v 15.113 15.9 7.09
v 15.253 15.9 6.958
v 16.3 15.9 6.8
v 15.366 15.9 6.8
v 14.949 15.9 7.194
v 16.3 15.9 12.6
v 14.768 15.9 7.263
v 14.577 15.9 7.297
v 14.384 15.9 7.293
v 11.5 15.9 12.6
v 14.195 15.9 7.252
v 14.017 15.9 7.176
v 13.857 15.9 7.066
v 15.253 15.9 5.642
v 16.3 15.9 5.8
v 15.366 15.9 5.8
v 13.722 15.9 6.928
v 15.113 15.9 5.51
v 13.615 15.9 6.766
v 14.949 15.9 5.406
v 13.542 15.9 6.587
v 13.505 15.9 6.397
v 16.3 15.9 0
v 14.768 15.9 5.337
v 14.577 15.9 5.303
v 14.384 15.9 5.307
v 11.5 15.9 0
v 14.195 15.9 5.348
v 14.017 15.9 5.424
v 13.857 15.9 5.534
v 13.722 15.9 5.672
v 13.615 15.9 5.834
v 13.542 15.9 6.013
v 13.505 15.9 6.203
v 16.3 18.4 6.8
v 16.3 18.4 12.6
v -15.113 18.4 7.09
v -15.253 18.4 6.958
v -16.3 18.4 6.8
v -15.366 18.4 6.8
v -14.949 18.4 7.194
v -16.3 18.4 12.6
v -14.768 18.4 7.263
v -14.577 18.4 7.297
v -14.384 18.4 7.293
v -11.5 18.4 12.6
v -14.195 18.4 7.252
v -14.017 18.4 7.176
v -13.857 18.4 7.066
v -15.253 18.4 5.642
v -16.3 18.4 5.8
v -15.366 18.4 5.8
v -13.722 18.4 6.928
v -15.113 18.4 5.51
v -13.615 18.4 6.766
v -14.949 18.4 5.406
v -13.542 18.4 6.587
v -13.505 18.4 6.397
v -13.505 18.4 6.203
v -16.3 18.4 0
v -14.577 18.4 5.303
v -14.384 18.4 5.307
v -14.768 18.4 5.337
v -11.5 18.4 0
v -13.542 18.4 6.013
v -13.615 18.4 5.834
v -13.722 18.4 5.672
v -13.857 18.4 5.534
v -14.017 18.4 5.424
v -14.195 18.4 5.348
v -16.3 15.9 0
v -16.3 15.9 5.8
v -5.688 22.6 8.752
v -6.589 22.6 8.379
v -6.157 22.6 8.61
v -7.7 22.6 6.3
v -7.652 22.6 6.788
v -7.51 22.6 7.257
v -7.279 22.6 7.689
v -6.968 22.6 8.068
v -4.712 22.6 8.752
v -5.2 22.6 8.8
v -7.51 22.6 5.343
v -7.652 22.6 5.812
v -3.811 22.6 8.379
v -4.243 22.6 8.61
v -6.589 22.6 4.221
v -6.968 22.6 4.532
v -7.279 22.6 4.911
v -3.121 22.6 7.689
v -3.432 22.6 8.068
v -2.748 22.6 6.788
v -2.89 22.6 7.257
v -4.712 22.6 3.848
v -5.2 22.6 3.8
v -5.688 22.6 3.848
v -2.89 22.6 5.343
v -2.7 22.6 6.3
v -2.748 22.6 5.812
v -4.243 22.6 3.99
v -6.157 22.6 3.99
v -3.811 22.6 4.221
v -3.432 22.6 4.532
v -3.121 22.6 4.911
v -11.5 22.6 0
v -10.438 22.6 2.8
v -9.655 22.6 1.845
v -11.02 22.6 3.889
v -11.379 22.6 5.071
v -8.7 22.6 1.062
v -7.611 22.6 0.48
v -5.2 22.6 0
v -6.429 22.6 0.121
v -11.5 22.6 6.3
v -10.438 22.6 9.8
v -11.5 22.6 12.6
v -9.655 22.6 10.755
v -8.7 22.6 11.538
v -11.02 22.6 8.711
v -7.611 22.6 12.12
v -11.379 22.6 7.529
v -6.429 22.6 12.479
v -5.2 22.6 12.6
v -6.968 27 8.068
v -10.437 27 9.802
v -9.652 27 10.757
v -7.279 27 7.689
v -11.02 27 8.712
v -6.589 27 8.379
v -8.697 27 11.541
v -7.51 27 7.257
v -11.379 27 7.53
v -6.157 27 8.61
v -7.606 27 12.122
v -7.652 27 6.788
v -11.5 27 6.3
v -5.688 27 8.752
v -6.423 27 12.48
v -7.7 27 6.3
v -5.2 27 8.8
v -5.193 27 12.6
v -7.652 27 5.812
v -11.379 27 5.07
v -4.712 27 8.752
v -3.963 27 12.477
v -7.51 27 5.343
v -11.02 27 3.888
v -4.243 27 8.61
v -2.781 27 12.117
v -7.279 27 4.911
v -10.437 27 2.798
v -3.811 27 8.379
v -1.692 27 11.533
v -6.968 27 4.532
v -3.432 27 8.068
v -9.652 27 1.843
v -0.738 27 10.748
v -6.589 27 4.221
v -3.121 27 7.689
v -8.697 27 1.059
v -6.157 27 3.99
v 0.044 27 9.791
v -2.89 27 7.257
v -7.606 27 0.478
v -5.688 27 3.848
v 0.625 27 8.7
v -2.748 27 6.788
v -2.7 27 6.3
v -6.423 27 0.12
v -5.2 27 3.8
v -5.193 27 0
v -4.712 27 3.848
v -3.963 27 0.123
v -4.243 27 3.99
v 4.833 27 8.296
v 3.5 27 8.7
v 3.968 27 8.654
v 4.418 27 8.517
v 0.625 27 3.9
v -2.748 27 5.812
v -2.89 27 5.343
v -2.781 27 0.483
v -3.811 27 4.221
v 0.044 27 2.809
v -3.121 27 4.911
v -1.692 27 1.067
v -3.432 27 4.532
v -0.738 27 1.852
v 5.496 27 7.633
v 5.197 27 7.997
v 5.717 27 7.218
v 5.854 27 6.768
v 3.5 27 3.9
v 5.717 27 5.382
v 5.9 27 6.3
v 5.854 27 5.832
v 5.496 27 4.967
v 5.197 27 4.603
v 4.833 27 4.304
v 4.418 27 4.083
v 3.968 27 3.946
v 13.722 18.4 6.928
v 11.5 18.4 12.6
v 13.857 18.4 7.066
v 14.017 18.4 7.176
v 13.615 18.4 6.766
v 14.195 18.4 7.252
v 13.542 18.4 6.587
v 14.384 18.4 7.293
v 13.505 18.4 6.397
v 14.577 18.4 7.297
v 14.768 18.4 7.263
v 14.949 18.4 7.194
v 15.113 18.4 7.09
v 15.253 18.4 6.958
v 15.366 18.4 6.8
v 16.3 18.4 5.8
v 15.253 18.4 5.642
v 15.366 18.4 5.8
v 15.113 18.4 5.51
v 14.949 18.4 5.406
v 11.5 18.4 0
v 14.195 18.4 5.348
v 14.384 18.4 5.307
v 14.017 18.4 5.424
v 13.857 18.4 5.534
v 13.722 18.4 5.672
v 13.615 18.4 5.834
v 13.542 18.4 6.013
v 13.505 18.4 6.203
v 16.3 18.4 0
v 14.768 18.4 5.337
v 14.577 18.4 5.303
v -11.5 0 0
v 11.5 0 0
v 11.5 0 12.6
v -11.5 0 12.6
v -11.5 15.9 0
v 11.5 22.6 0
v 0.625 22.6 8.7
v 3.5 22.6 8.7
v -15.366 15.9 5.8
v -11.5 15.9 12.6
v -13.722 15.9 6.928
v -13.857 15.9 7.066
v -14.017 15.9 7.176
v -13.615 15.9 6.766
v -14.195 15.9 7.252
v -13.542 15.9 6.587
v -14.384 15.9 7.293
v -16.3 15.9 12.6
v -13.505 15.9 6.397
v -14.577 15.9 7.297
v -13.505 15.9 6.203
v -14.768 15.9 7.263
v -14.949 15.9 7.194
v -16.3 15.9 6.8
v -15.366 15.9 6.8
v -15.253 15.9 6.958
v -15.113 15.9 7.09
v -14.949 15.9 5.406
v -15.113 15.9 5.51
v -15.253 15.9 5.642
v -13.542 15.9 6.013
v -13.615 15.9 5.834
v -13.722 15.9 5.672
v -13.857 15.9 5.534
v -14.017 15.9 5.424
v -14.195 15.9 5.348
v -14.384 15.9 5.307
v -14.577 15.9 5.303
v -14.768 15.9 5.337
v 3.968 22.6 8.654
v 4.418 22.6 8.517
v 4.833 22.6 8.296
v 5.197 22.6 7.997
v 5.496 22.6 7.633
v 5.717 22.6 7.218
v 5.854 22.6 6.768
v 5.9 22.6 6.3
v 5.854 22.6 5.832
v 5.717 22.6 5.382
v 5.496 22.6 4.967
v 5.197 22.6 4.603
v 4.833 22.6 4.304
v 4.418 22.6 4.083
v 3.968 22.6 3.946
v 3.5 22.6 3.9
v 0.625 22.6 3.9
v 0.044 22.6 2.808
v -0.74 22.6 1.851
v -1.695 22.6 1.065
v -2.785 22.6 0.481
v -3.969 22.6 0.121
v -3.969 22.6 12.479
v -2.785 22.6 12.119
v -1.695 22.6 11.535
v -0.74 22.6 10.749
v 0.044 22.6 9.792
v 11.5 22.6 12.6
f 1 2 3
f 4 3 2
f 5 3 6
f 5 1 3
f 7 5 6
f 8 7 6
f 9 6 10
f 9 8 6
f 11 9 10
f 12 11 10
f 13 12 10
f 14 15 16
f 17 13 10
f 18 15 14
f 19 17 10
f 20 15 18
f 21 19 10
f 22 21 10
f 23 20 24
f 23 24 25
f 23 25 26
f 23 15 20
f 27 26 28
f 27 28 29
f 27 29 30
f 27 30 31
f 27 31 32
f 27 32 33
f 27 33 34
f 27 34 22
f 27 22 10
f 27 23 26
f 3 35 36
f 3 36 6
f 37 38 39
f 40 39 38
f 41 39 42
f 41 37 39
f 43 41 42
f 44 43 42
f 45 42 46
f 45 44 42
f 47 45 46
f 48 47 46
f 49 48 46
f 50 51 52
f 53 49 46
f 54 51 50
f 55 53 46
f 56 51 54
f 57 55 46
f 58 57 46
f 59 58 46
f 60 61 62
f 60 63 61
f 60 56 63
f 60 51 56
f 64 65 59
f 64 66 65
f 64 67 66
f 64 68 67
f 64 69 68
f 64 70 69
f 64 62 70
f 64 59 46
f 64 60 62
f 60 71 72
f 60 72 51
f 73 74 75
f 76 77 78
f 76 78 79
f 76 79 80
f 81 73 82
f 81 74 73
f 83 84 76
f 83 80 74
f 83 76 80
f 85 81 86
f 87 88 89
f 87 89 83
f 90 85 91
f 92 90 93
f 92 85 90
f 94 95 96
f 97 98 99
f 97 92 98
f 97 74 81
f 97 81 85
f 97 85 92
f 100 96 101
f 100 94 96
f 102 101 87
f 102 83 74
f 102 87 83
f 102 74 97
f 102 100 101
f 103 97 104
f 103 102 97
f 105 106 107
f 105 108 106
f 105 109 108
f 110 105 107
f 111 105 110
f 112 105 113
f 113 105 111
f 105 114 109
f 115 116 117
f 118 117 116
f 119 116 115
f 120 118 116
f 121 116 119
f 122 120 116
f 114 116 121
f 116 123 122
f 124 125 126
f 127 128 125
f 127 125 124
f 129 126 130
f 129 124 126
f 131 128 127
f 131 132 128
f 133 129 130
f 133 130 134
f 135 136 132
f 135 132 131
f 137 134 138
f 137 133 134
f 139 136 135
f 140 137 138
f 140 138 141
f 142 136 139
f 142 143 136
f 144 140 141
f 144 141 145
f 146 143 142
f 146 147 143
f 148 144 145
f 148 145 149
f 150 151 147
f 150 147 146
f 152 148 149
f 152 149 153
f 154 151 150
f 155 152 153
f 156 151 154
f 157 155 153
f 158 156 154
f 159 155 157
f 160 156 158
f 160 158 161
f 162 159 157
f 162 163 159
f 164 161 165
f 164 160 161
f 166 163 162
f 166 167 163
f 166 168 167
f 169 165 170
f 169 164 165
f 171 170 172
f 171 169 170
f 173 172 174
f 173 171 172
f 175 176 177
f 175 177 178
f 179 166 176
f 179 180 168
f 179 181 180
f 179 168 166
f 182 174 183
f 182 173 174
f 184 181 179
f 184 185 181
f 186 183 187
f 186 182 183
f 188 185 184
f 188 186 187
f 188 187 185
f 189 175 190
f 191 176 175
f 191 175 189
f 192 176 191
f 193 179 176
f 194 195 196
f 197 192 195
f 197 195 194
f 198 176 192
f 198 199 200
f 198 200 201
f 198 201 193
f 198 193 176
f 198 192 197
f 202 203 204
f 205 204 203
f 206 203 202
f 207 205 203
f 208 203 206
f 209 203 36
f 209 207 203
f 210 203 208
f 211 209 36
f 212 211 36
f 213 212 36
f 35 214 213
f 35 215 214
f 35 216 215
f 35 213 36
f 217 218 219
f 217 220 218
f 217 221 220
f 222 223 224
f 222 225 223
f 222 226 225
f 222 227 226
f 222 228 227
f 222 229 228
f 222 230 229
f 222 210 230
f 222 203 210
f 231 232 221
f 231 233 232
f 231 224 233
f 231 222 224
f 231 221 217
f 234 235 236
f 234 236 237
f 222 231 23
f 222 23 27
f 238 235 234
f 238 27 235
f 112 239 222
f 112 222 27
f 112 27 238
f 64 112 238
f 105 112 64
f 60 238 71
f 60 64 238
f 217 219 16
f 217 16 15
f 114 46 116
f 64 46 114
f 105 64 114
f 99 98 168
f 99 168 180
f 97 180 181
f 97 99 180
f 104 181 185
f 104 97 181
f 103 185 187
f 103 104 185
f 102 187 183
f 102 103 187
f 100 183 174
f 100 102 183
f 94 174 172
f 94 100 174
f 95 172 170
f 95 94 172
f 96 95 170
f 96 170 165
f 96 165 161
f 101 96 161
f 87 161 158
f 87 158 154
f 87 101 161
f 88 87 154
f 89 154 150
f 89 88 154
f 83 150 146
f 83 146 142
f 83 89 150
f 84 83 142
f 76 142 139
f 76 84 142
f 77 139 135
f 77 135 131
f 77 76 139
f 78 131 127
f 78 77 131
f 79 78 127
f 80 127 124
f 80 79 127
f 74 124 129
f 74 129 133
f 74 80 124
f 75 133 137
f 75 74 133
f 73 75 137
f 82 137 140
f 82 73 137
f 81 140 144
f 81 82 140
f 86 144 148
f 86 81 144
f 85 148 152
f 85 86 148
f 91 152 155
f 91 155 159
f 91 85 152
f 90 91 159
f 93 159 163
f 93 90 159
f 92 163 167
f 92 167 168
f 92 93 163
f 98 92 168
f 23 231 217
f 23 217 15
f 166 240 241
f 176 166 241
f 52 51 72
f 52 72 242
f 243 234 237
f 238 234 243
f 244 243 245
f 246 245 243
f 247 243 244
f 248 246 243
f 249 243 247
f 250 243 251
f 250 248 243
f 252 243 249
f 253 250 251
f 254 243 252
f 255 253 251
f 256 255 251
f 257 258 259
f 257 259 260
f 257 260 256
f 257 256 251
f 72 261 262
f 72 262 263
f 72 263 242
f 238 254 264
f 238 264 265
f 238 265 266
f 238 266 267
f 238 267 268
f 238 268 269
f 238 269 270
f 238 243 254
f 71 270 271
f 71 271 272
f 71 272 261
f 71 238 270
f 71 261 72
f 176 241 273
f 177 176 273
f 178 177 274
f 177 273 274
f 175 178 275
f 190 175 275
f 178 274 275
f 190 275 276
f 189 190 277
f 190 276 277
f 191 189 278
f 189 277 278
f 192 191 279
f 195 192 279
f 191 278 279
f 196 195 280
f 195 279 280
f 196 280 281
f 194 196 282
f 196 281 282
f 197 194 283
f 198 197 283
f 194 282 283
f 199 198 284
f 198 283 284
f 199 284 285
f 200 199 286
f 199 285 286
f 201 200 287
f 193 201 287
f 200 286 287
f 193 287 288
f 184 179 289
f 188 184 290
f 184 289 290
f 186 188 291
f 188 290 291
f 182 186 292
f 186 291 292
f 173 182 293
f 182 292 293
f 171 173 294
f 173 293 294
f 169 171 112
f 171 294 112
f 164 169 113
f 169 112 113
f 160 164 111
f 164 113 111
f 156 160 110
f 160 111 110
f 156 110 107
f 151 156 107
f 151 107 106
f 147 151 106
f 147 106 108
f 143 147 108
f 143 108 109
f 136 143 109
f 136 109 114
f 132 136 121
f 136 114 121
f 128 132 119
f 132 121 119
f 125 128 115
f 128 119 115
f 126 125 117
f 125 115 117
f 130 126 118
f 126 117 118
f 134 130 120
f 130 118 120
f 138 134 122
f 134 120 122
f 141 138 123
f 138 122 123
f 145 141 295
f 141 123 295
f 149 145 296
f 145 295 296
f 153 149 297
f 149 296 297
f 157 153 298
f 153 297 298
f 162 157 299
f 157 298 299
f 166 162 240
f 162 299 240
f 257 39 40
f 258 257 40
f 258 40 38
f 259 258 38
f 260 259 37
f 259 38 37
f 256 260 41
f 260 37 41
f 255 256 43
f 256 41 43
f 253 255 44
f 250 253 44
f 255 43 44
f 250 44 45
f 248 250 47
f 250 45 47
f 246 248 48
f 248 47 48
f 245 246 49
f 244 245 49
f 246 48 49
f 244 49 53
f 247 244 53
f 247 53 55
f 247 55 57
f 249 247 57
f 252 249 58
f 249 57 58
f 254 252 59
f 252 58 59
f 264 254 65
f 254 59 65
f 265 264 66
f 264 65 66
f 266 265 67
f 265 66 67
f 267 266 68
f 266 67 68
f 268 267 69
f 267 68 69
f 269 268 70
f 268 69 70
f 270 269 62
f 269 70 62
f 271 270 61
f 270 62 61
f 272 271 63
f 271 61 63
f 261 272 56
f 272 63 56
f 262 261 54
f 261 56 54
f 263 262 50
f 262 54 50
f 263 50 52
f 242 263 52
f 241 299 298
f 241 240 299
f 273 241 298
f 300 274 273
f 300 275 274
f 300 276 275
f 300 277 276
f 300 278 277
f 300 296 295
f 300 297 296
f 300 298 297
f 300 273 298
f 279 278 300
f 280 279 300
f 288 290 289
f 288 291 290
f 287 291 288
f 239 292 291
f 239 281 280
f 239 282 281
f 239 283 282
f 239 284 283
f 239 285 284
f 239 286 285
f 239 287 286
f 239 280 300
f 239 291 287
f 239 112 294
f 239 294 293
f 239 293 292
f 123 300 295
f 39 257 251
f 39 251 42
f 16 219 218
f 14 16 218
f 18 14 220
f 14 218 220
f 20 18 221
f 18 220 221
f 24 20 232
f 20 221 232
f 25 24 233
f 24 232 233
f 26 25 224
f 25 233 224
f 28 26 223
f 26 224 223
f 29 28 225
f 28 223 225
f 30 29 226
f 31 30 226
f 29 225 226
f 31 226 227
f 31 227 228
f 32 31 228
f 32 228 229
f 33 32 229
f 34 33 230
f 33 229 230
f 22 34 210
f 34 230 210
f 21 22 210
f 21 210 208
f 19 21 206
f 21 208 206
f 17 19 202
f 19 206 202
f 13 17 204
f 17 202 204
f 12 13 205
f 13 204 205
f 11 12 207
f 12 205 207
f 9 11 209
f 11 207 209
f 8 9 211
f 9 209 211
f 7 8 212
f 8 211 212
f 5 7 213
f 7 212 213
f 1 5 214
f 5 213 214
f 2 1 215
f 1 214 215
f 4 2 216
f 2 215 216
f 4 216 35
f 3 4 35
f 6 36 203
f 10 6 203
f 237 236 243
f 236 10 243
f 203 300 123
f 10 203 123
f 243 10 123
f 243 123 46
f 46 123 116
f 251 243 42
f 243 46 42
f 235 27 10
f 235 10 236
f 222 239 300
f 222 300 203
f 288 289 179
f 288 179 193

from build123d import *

# Parameters (mm, degrees)
SALIENTE_EXTRUIR1_DEPTH = 12.6
CROQUIS2_R              = 1
CROQUIS2_W              = 0.933974596
CROQUIS2_H              = 1
CORTAR_EXTRUIR2_DEPTH   = 2.5
CROQUIS4_R              = 6.3
CROQUIS4_R_2            = 2.5
CROQUIS4_R_3            = 2.4
CROQUIS4_W              = 4.8
CROQUIS4_H              = 4.8
SALIENTE_EXTRUIR4_DEPTH = 4.4


with BuildPart() as part:
    # Croquis1 → Saliente-Extruir1 (new body)
    with BuildSketch(Plane.XY):
        Polygon((11.5, 0), (-11.5, 0), (-11.5, 15.9), (-16.3, 15.9), (-16.3, 18.4), (-11.5, 18.4), (-11.5, 22.6), (11.5, 22.6), (11.5, 18.4), (16.3, 18.4), (16.3, 15.9), (11.5, 15.9), align=None)
    extrude(amount=SALIENTE_EXTRUIR1_DEPTH)

    # Croquis2 → Cortar-Extruir2 (cut)
    with BuildSketch(Plane(origin=(0, 18.4, 0), x_dir=(1, 0, 0), z_dir=(0, 1, 0))):
        with Locations((-14.5, -6.3)):
            Circle(CROQUIS2_R)
        with Locations((14.5, -6.3)):
            Circle(CROQUIS2_R)
        with Locations((-15.833012702, -6.3)):
            Rectangle(CROQUIS2_W, CROQUIS2_H)
        with Locations((15.833012702, -6.3)):
            Rectangle(CROQUIS2_W, CROQUIS2_H)
    extrude(amount=-CORTAR_EXTRUIR2_DEPTH, mode=Mode.SUBTRACT)

    # Croquis4 → Saliente-Extruir4 (add)
    with BuildSketch(Plane(origin=(0, 22.6, 0), x_dir=(1, 0, 0), z_dir=(0, 1, 0))):
        with Locations((-5.2, -6.3)):
            Circle(CROQUIS4_R)
        with Locations((-5.2, -6.3)):
            Circle(CROQUIS4_R_2, mode=Mode.SUBTRACT)
        with Locations((3.5, -6.3)):
            Circle(CROQUIS4_R_3)
        with Locations((1.1, -6.3)):
            Rectangle(CROQUIS4_W, CROQUIS4_H)
    extrude(amount=SALIENTE_EXTRUIR4_DEPTH)


solid = part.part
